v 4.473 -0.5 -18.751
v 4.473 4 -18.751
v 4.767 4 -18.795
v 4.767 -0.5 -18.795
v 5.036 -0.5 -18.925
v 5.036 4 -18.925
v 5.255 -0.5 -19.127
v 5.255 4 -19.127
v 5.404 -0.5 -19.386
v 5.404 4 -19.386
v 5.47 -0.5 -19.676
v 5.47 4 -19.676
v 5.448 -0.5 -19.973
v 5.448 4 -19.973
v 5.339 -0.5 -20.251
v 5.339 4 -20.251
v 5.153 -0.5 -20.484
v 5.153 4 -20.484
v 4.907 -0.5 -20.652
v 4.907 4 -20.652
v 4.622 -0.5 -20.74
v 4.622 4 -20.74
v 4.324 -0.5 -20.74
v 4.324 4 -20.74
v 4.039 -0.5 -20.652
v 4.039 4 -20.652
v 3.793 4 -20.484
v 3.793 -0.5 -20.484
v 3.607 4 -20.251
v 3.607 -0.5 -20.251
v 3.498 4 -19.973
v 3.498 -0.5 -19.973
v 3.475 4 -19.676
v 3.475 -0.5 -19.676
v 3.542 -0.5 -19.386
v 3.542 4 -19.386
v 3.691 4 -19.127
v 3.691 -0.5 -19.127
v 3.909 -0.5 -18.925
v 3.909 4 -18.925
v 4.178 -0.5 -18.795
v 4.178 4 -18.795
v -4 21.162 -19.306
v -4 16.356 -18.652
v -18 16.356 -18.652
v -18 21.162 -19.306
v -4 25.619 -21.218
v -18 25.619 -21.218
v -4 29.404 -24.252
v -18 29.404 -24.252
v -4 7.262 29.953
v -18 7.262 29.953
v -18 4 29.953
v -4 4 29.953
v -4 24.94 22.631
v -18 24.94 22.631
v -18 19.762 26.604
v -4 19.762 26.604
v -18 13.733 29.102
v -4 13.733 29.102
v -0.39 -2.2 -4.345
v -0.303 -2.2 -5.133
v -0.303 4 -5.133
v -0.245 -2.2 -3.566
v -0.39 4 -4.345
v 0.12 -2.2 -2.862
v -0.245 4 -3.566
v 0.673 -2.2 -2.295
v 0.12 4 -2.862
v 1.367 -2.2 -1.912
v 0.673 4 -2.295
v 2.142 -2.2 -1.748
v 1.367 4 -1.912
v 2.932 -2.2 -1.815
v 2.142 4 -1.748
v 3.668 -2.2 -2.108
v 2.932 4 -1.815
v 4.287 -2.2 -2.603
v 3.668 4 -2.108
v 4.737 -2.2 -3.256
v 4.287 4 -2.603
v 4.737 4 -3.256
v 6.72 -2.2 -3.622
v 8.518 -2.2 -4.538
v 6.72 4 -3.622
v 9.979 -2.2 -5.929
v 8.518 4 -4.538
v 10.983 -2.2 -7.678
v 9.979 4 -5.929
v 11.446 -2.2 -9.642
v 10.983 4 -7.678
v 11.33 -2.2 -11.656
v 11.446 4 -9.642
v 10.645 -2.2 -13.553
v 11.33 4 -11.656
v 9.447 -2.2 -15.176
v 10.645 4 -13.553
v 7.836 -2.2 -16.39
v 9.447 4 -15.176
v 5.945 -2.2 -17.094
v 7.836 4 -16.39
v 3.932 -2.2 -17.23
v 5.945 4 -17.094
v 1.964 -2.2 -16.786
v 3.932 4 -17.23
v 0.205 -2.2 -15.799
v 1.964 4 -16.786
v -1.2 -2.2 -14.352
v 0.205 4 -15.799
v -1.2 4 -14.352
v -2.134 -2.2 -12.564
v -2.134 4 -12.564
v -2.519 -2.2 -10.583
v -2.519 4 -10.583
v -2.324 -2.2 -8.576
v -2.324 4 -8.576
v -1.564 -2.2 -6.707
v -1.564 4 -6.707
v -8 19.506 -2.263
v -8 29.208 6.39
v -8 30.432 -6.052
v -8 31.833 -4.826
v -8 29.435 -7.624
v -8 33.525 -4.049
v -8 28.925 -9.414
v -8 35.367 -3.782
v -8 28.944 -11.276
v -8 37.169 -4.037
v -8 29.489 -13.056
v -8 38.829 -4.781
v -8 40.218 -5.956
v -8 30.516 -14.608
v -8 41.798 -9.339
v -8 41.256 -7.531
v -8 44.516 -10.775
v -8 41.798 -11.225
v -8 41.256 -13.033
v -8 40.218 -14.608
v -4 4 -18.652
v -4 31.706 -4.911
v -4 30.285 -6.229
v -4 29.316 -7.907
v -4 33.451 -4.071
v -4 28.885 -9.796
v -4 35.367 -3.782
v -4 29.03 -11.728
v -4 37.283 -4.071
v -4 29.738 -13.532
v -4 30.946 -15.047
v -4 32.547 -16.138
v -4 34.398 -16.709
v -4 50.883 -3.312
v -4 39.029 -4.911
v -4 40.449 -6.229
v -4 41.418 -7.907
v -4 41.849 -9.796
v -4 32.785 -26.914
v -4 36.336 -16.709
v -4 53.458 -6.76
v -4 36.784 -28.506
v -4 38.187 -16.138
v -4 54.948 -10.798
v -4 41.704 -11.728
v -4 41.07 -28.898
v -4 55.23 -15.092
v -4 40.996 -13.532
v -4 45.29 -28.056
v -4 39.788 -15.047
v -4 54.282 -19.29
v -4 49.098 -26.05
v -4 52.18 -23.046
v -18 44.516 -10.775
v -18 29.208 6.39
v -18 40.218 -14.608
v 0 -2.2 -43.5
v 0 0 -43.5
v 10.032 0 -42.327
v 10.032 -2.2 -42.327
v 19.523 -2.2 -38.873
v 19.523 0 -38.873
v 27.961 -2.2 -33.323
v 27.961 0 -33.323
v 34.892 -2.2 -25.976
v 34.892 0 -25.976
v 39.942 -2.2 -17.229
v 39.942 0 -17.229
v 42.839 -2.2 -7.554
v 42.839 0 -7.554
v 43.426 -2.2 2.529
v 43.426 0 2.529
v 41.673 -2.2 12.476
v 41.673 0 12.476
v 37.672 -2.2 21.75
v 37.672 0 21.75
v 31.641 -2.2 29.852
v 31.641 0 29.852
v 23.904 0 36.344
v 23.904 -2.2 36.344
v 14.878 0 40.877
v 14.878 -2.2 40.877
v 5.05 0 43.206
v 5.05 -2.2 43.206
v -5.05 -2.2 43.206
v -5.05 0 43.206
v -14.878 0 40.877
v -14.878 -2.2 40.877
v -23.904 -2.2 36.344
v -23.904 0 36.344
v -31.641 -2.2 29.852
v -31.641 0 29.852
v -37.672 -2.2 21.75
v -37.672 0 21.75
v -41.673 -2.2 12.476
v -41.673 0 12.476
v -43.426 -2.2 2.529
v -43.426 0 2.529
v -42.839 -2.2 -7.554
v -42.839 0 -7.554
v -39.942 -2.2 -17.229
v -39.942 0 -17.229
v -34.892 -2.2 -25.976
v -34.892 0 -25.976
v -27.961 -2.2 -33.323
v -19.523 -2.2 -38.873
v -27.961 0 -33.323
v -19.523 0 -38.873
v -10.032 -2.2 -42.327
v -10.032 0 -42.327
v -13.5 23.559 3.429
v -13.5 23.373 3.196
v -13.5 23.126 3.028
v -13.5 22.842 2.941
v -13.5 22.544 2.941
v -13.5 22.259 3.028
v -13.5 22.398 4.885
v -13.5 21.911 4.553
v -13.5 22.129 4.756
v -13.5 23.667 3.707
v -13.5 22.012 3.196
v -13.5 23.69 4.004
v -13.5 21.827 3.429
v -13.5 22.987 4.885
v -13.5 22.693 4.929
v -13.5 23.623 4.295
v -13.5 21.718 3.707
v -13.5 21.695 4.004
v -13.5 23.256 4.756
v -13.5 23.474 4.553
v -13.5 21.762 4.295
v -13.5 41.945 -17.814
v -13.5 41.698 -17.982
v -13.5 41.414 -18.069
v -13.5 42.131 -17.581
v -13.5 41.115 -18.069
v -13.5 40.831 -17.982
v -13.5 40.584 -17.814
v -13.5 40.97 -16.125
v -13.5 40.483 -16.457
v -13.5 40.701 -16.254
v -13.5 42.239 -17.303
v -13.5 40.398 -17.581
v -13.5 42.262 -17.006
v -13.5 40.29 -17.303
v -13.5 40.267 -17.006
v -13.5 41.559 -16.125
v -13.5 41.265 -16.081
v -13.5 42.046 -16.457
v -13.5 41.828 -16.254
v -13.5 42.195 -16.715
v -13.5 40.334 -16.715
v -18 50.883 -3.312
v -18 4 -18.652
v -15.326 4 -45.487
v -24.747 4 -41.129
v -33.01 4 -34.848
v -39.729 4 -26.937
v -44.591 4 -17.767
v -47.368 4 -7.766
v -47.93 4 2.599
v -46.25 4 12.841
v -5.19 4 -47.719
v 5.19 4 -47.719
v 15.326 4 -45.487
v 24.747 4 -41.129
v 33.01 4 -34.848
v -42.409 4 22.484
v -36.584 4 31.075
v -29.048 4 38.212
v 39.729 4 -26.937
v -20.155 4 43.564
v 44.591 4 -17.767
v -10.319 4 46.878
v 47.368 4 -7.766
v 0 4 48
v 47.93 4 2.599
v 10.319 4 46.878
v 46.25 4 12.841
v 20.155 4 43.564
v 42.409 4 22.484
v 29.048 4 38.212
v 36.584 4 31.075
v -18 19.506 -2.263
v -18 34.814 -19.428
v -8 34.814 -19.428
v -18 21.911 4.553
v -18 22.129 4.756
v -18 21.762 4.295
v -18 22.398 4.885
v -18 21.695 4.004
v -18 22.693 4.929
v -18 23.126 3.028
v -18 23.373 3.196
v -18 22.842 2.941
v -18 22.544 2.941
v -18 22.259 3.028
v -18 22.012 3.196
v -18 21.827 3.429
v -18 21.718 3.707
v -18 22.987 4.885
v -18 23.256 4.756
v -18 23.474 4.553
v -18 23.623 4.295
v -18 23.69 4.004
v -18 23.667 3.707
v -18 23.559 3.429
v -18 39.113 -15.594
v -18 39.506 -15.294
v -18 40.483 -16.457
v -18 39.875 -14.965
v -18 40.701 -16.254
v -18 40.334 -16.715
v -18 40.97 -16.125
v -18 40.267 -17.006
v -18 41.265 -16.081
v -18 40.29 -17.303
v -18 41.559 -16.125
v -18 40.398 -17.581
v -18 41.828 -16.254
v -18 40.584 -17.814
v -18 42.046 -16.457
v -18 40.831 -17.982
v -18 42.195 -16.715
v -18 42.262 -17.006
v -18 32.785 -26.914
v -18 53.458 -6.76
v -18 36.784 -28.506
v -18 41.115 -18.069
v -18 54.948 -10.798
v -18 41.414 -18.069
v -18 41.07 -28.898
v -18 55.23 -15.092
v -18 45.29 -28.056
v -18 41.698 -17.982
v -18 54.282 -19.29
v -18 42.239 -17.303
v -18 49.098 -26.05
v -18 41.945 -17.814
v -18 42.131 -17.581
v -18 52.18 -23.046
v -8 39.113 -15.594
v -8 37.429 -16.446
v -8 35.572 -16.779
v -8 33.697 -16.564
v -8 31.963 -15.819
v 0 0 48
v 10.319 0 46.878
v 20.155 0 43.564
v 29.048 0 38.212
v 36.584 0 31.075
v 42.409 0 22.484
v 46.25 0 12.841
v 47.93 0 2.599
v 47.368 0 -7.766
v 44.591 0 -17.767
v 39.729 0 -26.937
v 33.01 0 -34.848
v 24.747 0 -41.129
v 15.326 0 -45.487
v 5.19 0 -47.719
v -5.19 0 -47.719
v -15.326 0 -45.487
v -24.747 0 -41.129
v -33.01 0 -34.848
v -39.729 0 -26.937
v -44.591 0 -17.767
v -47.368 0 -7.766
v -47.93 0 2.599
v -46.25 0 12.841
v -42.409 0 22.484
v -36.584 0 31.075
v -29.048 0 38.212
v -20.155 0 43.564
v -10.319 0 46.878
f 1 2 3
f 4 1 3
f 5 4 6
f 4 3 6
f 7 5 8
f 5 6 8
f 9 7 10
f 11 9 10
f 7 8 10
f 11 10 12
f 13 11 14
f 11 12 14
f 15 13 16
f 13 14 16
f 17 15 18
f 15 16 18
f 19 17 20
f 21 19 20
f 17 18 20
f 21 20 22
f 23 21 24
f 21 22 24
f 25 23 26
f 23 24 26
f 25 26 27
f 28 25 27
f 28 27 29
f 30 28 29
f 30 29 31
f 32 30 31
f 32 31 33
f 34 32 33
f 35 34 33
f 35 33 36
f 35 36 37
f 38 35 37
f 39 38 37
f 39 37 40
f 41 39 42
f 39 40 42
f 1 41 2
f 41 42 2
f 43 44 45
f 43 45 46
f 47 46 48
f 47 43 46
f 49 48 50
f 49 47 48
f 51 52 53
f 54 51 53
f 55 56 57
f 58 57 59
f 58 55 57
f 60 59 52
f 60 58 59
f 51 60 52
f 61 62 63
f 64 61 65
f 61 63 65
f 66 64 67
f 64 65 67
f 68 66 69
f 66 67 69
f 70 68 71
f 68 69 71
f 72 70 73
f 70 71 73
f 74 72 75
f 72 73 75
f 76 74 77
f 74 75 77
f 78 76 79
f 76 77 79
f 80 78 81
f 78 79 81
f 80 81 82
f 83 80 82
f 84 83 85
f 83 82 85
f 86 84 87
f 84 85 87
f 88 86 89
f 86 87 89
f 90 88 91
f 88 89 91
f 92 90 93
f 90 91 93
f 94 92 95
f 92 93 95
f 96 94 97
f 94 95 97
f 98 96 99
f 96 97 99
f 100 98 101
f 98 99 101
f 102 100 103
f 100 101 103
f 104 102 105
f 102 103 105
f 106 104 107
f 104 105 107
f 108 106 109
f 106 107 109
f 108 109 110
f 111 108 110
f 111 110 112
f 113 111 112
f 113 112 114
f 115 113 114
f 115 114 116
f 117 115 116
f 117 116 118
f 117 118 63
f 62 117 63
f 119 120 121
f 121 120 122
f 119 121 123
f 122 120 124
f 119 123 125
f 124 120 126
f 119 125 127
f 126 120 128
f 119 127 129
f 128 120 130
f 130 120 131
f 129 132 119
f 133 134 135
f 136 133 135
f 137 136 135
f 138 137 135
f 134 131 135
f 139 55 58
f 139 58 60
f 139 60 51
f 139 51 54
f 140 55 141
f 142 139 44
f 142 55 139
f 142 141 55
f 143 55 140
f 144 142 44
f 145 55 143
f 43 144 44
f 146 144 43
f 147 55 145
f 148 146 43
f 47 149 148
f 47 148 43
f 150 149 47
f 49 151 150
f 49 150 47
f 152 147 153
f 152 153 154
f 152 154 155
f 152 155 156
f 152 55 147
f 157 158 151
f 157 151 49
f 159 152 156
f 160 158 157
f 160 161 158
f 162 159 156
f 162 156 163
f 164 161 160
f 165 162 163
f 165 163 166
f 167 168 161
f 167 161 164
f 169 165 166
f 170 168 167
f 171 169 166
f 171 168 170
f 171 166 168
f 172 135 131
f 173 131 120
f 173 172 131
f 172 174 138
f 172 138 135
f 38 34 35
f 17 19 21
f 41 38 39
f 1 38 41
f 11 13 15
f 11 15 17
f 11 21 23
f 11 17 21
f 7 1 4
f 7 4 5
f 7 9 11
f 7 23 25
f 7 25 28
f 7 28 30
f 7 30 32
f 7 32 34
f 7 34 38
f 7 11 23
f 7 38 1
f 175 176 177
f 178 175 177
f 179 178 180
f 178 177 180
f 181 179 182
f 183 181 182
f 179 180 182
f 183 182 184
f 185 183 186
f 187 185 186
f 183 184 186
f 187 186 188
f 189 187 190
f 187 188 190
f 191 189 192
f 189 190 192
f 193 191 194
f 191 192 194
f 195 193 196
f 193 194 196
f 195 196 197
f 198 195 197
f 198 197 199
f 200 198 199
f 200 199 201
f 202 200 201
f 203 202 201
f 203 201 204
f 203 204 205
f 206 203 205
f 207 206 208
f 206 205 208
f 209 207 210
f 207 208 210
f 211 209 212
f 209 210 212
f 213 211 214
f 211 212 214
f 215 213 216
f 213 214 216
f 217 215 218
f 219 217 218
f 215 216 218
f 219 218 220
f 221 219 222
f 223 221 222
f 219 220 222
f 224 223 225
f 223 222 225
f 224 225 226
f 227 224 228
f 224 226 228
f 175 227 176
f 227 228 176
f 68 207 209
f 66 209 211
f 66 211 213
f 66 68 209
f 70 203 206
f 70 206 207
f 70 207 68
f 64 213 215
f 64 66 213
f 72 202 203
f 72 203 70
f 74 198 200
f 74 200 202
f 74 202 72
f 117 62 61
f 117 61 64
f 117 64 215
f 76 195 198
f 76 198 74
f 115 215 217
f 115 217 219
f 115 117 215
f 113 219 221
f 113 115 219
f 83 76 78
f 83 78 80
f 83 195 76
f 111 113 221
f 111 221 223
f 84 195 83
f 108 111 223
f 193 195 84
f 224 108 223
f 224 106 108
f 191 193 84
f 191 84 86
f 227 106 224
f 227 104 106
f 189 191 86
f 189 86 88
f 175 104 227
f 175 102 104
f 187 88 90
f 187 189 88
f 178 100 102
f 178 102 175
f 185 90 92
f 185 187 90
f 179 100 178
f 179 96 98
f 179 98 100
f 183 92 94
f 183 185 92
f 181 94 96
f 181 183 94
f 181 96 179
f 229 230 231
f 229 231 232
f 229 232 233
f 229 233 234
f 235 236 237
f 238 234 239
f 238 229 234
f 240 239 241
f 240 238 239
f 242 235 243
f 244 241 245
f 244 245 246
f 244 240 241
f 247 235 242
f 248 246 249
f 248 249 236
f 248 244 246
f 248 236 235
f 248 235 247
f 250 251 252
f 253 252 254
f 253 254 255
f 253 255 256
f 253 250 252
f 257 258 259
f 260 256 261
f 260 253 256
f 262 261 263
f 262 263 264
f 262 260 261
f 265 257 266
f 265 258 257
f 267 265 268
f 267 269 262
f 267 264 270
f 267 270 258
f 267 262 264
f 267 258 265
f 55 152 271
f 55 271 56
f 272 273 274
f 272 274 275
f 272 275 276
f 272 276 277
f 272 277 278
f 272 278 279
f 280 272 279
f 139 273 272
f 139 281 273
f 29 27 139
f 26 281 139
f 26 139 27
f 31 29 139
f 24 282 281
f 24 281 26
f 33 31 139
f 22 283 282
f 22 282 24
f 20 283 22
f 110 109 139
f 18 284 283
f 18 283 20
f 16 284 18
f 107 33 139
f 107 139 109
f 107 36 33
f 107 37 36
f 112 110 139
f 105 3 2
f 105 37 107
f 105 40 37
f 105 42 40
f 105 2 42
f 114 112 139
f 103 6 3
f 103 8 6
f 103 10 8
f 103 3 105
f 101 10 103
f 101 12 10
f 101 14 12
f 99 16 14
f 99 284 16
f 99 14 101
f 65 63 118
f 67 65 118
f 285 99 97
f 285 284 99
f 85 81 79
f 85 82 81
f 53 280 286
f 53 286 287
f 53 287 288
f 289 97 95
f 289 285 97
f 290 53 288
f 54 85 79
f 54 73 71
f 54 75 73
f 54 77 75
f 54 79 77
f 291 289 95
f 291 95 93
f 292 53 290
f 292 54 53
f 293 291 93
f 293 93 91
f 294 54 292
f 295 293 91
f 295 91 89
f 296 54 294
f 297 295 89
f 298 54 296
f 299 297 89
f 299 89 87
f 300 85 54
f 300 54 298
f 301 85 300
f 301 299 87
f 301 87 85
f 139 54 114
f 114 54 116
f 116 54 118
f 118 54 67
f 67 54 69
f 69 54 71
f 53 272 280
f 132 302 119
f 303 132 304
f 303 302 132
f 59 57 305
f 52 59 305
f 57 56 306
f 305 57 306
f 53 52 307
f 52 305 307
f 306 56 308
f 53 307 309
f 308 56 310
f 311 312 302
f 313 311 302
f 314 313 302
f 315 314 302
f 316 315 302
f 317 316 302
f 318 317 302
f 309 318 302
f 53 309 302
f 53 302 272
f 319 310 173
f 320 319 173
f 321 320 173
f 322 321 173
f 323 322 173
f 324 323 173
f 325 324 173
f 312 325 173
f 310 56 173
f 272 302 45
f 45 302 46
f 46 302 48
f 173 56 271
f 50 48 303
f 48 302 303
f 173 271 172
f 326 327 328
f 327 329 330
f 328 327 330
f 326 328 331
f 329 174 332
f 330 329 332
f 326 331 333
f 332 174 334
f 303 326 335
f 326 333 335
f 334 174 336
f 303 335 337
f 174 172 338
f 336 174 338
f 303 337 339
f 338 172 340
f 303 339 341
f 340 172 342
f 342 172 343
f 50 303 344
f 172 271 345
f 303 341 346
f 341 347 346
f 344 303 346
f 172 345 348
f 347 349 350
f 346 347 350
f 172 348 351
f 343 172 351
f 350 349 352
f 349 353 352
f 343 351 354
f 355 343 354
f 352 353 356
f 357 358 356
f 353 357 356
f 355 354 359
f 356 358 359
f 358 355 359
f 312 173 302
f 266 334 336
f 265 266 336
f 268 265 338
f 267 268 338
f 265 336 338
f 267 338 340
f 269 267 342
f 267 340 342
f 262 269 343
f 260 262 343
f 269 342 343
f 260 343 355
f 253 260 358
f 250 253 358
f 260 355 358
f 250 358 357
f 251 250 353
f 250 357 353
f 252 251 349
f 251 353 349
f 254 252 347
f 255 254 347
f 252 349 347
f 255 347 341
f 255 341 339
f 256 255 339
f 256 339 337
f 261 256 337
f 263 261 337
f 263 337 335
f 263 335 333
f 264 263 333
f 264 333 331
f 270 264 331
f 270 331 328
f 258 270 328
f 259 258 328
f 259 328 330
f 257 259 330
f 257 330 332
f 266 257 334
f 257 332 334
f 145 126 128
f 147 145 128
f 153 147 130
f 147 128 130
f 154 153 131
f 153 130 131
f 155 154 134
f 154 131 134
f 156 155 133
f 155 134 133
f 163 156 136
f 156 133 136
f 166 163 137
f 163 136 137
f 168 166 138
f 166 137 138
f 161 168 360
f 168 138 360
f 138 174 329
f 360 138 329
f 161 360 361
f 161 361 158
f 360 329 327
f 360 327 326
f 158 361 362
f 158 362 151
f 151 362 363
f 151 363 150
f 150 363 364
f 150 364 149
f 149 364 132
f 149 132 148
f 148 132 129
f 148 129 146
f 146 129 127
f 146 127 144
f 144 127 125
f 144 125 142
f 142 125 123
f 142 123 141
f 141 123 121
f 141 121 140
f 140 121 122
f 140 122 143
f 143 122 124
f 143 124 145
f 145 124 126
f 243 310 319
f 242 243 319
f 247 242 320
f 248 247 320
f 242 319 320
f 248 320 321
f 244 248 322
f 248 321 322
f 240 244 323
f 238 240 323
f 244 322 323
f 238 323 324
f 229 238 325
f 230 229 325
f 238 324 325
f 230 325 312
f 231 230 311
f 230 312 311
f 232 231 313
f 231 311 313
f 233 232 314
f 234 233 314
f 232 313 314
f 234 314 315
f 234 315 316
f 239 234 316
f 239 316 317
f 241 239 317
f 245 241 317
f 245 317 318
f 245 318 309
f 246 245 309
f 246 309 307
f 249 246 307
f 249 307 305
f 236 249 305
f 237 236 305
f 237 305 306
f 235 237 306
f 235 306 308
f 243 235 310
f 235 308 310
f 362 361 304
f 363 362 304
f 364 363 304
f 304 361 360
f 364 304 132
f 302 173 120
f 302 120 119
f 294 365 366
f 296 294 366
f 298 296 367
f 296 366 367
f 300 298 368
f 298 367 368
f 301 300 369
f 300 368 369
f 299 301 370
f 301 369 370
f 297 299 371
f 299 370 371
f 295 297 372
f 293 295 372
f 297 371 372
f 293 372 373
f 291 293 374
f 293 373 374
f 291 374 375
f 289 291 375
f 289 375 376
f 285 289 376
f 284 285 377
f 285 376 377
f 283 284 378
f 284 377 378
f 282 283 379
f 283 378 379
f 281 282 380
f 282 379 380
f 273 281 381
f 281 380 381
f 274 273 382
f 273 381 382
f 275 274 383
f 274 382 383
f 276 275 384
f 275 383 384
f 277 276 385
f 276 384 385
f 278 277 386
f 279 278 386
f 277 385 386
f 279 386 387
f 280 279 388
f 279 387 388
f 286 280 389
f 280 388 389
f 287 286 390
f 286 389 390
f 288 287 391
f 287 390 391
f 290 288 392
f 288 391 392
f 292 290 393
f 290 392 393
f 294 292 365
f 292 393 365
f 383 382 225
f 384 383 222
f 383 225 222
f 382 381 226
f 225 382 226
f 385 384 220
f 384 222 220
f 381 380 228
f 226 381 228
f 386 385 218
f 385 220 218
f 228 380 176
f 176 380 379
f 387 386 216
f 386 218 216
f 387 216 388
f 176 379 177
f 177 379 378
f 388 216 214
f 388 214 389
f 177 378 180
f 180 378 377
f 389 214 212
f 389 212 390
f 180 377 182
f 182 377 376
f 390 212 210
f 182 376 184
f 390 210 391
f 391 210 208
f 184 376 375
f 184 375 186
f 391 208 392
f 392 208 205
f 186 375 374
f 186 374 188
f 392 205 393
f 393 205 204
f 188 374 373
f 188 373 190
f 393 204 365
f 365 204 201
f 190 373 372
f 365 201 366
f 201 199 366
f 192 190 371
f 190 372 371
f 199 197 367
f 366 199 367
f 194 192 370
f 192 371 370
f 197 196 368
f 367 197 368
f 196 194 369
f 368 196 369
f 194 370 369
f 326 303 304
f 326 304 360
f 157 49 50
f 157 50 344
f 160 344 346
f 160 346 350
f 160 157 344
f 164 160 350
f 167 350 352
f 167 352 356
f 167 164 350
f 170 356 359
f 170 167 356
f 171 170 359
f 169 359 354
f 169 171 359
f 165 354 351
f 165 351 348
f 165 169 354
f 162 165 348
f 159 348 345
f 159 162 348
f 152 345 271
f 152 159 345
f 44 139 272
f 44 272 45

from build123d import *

# Parameters (mm, degrees)
SKETCH2_R           = 48
BOSS_EXTRUDE1_DEPTH = 4
BOSS_EXTRUDE2_DEPTH = 14
SKETCH31_R          = 6.5
CUT_EXTRUDE18_DEPTH = 96.977067922
CUT_EXTRUDE19_DEPTH = 10
SKETCH32_R          = 1
CUT_EXTRUDE20_DEPTH = 4.5
SKETCH33_R          = 43.5
BOSS_EXTRUDE3_DEPTH = 2.2
SKETCH35_R          = 7
CUT_EXTRUDE22_DEPTH = 93.968532394
SKETCH36_R          = 2.701818283
CUT_EXTRUDE24_DEPTH = 86.072189458
SKETCH37_R          = 1
CUT_EXTRUDE25_DEPTH = 4.5


with BuildPart() as part:
    # Sketch2 → Boss-Extrude1 (new body)
    with BuildSketch(Plane(origin=(0, 0, 0), x_dir=(1, 0, 0), z_dir=(0, 1, 0))):
        Circle(SKETCH2_R)
    extrude(amount=BOSS_EXTRUDE1_DEPTH)

    # Sketch7 → Boss-Extrude2 (add)
    with BuildSketch(Plane(origin=(-4, 0, 0), x_dir=(0, 0, -1), z_dir=(1, 0, 0))):
        with BuildLine():
            Line((18.652115716, 4), (18.652115716, 16.356133126))
            ThreePointArc((18.652115716, 16.356133126), (20.111216245, 23.455333411), (24.251965127, 29.403595153))
            ThreePointArc((24.251965127, 29.403595153), (24.659117989, 50.747356958), (3.311904584, 50.883081894))
            Line((3.311904584, 50.883081894), (-22.631121669, 24.94005564))
            ThreePointArc((-22.631121669, 24.94005564), (-28.050440452, 16.82947192), (-29.95345214, 7.262386111))
            Line((-29.95345214, 7.262386111), (-29.95345214, 4))
            Line((-29.95345214, 4), (18.652115716, 4))
        make_face()
    extrude(amount=-BOSS_EXTRUDE2_DEPTH)

    # Sketch31 → Cut-Extrude18 (cut, through all)
    with BuildSketch(Plane(origin=(-18, 10.461755651, -5.359516796), x_dir=(0, 0, 1), z_dir=(-1, 0, 0))):
        with Locations((-4.922469695, 24.905412087)):
            Circle(SKETCH31_R)
    extrude(amount=-CUT_EXTRUDE18_DEPTH, mode=Mode.SUBTRACT)

    # Sketch31<3> → Cut-Extrude19 (cut)
    with BuildSketch(Plane(origin=(-18, 10.461755651, -5.359516796), x_dir=(0, 0, 1), z_dir=(-1, 0, 0))):
        Polygon((-5.41546104, 34.054639751), (11.74960782, 18.74580534), (3.09678837, 9.043809897), (-14.06828049, 24.352644308), align=None)
    extrude(amount=-CUT_EXTRUDE19_DEPTH, mode=Mode.SUBTRACT)

    # Sketch32 → Cut-Extrude20 (cut)
    with BuildSketch(Plane.ZY.offset(18)):
        with Locations((-17.080620038, 41.264504586)):
            Circle(SKETCH32_R)
        with Locations((3.929449654, 22.692559529)):
            Circle(SKETCH32_R)
    extrude(amount=-CUT_EXTRUDE20_DEPTH, mode=Mode.SUBTRACT)

    # Sketch33 → Boss-Extrude3 (add)
    with BuildSketch(Plane.XZ):
        Circle(SKETCH33_R)
    extrude(amount=BOSS_EXTRUDE3_DEPTH)

    # Sketch35 → Cut-Extrude22 (cut, through all)
    with BuildSketch(Plane(origin=(-3.192833023, 4, -10.250875044), x_dir=(1, 0, 0), z_dir=(0, 1, 0))):
        with Locations((7.665516898, 0)):
            Circle(SKETCH35_R)
    extrude(amount=-CUT_EXTRUDE22_DEPTH, mode=Mode.SUBTRACT)

    # Sketch36 → Cut-Extrude24 (cut, through all)
    with BuildSketch(Plane(origin=(0, 4, 0), x_dir=(1, 0, 0), z_dir=(0, 1, 0))):
        with Locations((2.310071728, 4.444115209)):
            Circle(SKETCH36_R)
    extrude(amount=-CUT_EXTRUDE24_DEPTH, mode=Mode.SUBTRACT)

    # Sketch37 → Cut-Extrude25 (cut)
    with BuildSketch(Plane(origin=(0, 4, 0), x_dir=(1, 0, 0), z_dir=(0, 1, 0))):
        with Locations((4.472683875, 19.750875044)):
            Circle(SKETCH37_R)
    extrude(amount=-CUT_EXTRUDE25_DEPTH, mode=Mode.SUBTRACT)


solid = part.part
